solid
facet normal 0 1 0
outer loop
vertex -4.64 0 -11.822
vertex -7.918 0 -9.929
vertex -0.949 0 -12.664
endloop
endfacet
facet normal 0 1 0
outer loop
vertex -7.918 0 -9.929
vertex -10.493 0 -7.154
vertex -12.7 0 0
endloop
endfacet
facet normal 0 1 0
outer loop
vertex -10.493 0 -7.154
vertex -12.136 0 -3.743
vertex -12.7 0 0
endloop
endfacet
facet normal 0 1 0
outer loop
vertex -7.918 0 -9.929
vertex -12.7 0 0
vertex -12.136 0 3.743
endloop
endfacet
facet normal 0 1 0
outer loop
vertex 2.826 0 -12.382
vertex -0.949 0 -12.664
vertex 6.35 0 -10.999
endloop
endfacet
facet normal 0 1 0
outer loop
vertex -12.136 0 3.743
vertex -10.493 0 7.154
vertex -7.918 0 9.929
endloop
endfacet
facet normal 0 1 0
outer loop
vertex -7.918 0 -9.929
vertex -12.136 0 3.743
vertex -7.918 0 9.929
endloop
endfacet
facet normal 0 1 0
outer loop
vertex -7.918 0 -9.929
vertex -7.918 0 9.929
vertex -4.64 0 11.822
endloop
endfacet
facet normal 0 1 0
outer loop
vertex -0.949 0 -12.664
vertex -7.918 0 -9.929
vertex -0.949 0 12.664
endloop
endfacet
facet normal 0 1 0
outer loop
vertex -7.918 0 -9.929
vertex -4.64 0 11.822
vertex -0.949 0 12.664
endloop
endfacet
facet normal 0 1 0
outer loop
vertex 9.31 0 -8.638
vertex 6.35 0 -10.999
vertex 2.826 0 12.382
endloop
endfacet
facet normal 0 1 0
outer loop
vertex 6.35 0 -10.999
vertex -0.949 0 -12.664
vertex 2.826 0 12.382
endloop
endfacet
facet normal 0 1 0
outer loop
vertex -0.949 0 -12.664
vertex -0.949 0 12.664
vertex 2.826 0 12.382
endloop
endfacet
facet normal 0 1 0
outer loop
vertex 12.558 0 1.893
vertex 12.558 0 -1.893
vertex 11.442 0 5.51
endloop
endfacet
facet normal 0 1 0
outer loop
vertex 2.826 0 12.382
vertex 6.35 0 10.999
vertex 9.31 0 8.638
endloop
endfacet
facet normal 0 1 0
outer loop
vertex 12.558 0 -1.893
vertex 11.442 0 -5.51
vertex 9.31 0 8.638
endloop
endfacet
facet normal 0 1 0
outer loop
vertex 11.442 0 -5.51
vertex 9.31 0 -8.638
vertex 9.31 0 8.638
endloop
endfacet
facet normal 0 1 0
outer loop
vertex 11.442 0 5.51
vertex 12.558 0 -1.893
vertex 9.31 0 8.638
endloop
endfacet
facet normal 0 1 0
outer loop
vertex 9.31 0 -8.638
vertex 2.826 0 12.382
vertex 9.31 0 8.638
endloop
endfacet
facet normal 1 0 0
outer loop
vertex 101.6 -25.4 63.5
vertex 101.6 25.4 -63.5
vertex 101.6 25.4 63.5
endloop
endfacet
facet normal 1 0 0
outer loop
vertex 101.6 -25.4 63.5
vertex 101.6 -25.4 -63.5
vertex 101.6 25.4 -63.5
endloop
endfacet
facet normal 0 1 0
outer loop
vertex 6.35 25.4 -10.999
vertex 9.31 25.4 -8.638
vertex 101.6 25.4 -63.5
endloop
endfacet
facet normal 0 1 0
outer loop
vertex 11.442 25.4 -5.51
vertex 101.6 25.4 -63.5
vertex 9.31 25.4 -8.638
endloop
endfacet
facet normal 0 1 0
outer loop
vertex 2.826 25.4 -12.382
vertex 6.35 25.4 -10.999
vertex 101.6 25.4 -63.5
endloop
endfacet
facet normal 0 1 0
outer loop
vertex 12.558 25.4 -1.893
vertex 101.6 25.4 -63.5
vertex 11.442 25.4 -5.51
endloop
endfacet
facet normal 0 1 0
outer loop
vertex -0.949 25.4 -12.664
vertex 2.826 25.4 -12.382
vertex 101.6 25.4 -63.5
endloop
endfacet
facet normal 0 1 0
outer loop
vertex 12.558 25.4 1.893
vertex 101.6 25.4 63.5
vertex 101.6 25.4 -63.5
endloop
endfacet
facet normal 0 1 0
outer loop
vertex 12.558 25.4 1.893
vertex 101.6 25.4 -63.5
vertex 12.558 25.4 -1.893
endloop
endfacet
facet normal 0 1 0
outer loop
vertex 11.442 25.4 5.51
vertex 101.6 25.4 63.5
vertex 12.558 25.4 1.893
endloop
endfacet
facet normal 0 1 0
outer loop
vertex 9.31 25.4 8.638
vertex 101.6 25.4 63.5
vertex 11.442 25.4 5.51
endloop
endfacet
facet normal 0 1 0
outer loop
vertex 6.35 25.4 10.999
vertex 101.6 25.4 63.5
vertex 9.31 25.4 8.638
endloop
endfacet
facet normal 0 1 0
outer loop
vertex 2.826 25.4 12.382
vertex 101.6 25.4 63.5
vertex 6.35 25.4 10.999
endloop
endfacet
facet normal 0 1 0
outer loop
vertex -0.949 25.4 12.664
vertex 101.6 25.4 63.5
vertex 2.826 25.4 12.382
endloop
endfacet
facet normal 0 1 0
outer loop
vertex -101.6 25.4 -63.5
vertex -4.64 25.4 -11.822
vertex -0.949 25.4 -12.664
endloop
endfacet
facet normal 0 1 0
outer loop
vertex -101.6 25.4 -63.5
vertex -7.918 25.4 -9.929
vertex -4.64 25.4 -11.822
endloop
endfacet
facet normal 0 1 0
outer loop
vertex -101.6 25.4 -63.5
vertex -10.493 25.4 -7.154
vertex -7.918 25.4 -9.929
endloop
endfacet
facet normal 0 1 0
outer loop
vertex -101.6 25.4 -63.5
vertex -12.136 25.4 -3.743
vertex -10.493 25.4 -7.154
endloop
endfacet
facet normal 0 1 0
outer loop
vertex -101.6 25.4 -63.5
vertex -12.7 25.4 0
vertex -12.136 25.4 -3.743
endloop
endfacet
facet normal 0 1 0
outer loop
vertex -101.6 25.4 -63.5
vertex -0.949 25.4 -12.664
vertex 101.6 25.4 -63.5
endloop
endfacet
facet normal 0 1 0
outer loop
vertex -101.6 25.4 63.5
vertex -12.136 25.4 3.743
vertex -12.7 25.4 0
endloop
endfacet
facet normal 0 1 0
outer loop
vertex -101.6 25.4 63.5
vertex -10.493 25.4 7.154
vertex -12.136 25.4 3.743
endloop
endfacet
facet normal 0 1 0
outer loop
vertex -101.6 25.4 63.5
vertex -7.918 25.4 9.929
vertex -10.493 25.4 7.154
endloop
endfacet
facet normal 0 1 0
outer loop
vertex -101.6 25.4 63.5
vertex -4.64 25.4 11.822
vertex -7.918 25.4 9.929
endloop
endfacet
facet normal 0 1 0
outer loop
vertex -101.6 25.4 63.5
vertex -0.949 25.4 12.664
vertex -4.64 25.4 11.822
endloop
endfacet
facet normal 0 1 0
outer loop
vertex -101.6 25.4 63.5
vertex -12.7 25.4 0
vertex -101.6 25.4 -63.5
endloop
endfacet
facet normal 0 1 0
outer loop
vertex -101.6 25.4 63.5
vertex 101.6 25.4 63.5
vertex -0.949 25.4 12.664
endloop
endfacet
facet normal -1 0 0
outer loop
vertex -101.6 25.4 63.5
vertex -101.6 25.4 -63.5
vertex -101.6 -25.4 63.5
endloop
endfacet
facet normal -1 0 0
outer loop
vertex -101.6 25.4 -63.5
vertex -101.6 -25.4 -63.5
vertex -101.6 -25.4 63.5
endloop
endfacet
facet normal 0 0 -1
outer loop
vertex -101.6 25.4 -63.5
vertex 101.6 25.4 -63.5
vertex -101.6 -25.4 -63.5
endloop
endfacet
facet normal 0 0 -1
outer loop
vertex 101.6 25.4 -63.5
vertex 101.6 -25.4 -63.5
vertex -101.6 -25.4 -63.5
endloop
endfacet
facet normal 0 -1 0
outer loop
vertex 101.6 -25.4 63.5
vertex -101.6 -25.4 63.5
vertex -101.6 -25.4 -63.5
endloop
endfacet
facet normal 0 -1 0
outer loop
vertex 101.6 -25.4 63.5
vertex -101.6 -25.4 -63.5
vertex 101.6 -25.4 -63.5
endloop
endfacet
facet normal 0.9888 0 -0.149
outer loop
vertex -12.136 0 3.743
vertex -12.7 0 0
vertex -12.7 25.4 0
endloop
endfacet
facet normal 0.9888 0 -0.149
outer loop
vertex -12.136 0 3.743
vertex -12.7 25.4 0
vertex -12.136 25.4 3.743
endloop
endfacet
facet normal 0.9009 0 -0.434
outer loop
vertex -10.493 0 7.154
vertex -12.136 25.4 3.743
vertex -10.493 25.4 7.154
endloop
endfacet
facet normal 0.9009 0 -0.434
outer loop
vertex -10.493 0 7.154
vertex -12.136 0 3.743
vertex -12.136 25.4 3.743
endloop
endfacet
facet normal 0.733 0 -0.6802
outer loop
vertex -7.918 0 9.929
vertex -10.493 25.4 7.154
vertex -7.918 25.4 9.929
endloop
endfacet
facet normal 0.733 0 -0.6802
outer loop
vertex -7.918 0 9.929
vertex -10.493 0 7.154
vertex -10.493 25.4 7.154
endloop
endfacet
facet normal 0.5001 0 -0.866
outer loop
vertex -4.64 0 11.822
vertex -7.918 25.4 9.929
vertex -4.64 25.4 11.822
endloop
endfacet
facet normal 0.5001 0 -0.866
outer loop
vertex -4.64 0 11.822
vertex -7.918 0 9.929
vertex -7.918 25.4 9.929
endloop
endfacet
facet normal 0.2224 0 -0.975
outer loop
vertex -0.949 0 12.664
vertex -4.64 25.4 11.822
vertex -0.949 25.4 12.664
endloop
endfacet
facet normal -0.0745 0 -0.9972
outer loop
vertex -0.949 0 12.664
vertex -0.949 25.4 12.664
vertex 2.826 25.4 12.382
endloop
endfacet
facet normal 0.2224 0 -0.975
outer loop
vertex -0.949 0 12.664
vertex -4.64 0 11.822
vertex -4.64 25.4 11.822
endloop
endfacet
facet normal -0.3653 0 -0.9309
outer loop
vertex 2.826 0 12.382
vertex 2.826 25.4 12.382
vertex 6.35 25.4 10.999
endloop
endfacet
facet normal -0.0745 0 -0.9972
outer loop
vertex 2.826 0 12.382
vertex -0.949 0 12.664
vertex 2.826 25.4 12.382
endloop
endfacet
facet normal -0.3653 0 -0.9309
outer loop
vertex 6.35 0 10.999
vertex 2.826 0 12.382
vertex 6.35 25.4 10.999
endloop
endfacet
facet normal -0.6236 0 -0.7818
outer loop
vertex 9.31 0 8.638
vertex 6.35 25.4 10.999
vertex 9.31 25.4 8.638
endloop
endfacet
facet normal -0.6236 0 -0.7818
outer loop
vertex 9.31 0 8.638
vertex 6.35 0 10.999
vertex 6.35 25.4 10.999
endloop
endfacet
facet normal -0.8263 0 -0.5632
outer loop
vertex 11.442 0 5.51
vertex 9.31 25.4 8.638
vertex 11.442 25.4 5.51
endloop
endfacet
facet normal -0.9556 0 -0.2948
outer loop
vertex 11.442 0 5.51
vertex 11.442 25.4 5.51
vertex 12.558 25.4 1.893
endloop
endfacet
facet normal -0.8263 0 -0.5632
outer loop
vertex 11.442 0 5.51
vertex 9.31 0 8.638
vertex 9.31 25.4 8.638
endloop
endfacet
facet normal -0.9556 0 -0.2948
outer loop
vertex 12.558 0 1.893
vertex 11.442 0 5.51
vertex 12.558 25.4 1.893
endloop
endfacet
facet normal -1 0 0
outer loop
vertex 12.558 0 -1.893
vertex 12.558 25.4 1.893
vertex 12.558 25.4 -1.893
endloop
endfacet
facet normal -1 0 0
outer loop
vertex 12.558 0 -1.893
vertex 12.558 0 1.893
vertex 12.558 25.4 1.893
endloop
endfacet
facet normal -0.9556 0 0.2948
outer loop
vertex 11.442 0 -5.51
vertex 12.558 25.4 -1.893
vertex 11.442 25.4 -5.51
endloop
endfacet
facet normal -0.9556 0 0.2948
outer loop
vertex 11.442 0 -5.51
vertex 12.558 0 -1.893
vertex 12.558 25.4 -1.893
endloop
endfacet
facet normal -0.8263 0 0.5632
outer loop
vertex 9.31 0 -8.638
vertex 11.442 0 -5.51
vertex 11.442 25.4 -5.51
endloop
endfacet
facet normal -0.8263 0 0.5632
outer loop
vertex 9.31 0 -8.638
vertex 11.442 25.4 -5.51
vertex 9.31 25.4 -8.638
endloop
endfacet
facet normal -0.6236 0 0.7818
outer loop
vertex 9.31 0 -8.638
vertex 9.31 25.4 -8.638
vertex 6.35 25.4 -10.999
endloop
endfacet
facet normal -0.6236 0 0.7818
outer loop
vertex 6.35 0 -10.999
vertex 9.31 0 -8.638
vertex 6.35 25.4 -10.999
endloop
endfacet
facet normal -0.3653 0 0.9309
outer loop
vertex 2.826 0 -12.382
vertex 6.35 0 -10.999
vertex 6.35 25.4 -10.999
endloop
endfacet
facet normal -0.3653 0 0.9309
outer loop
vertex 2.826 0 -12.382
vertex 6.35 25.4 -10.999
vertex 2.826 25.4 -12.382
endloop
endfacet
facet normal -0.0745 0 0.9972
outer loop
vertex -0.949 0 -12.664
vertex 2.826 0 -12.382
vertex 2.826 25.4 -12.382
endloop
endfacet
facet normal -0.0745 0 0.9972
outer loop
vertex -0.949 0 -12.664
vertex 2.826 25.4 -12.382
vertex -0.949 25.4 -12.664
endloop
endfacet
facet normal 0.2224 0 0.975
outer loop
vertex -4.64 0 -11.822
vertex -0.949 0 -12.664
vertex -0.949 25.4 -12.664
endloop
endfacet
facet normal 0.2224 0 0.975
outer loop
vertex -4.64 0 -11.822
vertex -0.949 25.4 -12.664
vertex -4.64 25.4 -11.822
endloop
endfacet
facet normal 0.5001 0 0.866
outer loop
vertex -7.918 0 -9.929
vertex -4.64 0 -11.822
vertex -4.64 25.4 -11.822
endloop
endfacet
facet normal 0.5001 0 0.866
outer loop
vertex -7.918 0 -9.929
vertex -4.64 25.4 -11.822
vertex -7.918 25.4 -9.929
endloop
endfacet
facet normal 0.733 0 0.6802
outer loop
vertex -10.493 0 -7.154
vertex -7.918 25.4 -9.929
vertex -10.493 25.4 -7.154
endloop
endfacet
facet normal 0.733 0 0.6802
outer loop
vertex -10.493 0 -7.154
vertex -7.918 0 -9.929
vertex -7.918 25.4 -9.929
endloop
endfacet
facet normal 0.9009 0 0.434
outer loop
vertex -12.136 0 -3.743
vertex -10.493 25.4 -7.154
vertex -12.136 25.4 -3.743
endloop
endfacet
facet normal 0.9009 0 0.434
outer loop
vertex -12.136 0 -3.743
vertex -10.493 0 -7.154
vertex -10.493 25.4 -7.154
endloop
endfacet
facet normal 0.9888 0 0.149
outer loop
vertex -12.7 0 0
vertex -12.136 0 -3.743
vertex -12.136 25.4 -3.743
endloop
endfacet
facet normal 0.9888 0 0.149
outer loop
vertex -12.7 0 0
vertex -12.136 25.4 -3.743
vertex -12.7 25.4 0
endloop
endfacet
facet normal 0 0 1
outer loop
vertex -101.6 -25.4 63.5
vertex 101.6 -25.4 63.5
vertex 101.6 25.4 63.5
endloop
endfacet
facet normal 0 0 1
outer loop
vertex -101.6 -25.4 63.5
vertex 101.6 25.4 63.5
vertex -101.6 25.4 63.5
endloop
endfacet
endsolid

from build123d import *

# Parameters (mm, degrees)
F0_W     = 203.2
F0_H     = 127
F1_DEPTH = 25.4
F2_W     = 203.2
F2_H     = 127
F2_R     = 12.7
F3_DEPTH = 25.4


with BuildPart() as f1:
    # F0 (on Front) → F1 (new body)
    with BuildSketch(Plane.XZ):
        Rectangle(F0_W, F0_H)
    extrude(amount=F1_DEPTH)

    # F2 (on face) → F3 (join)
    with BuildSketch(Plane(origin=(0, 0, 0), x_dir=(-1, 0, 0), z_dir=(0, 1, 0))):
        Rectangle(F2_W, F2_H)
        Circle(F2_R, mode=Mode.SUBTRACT)
    extrude(amount=F3_DEPTH)


solid = f1.part
